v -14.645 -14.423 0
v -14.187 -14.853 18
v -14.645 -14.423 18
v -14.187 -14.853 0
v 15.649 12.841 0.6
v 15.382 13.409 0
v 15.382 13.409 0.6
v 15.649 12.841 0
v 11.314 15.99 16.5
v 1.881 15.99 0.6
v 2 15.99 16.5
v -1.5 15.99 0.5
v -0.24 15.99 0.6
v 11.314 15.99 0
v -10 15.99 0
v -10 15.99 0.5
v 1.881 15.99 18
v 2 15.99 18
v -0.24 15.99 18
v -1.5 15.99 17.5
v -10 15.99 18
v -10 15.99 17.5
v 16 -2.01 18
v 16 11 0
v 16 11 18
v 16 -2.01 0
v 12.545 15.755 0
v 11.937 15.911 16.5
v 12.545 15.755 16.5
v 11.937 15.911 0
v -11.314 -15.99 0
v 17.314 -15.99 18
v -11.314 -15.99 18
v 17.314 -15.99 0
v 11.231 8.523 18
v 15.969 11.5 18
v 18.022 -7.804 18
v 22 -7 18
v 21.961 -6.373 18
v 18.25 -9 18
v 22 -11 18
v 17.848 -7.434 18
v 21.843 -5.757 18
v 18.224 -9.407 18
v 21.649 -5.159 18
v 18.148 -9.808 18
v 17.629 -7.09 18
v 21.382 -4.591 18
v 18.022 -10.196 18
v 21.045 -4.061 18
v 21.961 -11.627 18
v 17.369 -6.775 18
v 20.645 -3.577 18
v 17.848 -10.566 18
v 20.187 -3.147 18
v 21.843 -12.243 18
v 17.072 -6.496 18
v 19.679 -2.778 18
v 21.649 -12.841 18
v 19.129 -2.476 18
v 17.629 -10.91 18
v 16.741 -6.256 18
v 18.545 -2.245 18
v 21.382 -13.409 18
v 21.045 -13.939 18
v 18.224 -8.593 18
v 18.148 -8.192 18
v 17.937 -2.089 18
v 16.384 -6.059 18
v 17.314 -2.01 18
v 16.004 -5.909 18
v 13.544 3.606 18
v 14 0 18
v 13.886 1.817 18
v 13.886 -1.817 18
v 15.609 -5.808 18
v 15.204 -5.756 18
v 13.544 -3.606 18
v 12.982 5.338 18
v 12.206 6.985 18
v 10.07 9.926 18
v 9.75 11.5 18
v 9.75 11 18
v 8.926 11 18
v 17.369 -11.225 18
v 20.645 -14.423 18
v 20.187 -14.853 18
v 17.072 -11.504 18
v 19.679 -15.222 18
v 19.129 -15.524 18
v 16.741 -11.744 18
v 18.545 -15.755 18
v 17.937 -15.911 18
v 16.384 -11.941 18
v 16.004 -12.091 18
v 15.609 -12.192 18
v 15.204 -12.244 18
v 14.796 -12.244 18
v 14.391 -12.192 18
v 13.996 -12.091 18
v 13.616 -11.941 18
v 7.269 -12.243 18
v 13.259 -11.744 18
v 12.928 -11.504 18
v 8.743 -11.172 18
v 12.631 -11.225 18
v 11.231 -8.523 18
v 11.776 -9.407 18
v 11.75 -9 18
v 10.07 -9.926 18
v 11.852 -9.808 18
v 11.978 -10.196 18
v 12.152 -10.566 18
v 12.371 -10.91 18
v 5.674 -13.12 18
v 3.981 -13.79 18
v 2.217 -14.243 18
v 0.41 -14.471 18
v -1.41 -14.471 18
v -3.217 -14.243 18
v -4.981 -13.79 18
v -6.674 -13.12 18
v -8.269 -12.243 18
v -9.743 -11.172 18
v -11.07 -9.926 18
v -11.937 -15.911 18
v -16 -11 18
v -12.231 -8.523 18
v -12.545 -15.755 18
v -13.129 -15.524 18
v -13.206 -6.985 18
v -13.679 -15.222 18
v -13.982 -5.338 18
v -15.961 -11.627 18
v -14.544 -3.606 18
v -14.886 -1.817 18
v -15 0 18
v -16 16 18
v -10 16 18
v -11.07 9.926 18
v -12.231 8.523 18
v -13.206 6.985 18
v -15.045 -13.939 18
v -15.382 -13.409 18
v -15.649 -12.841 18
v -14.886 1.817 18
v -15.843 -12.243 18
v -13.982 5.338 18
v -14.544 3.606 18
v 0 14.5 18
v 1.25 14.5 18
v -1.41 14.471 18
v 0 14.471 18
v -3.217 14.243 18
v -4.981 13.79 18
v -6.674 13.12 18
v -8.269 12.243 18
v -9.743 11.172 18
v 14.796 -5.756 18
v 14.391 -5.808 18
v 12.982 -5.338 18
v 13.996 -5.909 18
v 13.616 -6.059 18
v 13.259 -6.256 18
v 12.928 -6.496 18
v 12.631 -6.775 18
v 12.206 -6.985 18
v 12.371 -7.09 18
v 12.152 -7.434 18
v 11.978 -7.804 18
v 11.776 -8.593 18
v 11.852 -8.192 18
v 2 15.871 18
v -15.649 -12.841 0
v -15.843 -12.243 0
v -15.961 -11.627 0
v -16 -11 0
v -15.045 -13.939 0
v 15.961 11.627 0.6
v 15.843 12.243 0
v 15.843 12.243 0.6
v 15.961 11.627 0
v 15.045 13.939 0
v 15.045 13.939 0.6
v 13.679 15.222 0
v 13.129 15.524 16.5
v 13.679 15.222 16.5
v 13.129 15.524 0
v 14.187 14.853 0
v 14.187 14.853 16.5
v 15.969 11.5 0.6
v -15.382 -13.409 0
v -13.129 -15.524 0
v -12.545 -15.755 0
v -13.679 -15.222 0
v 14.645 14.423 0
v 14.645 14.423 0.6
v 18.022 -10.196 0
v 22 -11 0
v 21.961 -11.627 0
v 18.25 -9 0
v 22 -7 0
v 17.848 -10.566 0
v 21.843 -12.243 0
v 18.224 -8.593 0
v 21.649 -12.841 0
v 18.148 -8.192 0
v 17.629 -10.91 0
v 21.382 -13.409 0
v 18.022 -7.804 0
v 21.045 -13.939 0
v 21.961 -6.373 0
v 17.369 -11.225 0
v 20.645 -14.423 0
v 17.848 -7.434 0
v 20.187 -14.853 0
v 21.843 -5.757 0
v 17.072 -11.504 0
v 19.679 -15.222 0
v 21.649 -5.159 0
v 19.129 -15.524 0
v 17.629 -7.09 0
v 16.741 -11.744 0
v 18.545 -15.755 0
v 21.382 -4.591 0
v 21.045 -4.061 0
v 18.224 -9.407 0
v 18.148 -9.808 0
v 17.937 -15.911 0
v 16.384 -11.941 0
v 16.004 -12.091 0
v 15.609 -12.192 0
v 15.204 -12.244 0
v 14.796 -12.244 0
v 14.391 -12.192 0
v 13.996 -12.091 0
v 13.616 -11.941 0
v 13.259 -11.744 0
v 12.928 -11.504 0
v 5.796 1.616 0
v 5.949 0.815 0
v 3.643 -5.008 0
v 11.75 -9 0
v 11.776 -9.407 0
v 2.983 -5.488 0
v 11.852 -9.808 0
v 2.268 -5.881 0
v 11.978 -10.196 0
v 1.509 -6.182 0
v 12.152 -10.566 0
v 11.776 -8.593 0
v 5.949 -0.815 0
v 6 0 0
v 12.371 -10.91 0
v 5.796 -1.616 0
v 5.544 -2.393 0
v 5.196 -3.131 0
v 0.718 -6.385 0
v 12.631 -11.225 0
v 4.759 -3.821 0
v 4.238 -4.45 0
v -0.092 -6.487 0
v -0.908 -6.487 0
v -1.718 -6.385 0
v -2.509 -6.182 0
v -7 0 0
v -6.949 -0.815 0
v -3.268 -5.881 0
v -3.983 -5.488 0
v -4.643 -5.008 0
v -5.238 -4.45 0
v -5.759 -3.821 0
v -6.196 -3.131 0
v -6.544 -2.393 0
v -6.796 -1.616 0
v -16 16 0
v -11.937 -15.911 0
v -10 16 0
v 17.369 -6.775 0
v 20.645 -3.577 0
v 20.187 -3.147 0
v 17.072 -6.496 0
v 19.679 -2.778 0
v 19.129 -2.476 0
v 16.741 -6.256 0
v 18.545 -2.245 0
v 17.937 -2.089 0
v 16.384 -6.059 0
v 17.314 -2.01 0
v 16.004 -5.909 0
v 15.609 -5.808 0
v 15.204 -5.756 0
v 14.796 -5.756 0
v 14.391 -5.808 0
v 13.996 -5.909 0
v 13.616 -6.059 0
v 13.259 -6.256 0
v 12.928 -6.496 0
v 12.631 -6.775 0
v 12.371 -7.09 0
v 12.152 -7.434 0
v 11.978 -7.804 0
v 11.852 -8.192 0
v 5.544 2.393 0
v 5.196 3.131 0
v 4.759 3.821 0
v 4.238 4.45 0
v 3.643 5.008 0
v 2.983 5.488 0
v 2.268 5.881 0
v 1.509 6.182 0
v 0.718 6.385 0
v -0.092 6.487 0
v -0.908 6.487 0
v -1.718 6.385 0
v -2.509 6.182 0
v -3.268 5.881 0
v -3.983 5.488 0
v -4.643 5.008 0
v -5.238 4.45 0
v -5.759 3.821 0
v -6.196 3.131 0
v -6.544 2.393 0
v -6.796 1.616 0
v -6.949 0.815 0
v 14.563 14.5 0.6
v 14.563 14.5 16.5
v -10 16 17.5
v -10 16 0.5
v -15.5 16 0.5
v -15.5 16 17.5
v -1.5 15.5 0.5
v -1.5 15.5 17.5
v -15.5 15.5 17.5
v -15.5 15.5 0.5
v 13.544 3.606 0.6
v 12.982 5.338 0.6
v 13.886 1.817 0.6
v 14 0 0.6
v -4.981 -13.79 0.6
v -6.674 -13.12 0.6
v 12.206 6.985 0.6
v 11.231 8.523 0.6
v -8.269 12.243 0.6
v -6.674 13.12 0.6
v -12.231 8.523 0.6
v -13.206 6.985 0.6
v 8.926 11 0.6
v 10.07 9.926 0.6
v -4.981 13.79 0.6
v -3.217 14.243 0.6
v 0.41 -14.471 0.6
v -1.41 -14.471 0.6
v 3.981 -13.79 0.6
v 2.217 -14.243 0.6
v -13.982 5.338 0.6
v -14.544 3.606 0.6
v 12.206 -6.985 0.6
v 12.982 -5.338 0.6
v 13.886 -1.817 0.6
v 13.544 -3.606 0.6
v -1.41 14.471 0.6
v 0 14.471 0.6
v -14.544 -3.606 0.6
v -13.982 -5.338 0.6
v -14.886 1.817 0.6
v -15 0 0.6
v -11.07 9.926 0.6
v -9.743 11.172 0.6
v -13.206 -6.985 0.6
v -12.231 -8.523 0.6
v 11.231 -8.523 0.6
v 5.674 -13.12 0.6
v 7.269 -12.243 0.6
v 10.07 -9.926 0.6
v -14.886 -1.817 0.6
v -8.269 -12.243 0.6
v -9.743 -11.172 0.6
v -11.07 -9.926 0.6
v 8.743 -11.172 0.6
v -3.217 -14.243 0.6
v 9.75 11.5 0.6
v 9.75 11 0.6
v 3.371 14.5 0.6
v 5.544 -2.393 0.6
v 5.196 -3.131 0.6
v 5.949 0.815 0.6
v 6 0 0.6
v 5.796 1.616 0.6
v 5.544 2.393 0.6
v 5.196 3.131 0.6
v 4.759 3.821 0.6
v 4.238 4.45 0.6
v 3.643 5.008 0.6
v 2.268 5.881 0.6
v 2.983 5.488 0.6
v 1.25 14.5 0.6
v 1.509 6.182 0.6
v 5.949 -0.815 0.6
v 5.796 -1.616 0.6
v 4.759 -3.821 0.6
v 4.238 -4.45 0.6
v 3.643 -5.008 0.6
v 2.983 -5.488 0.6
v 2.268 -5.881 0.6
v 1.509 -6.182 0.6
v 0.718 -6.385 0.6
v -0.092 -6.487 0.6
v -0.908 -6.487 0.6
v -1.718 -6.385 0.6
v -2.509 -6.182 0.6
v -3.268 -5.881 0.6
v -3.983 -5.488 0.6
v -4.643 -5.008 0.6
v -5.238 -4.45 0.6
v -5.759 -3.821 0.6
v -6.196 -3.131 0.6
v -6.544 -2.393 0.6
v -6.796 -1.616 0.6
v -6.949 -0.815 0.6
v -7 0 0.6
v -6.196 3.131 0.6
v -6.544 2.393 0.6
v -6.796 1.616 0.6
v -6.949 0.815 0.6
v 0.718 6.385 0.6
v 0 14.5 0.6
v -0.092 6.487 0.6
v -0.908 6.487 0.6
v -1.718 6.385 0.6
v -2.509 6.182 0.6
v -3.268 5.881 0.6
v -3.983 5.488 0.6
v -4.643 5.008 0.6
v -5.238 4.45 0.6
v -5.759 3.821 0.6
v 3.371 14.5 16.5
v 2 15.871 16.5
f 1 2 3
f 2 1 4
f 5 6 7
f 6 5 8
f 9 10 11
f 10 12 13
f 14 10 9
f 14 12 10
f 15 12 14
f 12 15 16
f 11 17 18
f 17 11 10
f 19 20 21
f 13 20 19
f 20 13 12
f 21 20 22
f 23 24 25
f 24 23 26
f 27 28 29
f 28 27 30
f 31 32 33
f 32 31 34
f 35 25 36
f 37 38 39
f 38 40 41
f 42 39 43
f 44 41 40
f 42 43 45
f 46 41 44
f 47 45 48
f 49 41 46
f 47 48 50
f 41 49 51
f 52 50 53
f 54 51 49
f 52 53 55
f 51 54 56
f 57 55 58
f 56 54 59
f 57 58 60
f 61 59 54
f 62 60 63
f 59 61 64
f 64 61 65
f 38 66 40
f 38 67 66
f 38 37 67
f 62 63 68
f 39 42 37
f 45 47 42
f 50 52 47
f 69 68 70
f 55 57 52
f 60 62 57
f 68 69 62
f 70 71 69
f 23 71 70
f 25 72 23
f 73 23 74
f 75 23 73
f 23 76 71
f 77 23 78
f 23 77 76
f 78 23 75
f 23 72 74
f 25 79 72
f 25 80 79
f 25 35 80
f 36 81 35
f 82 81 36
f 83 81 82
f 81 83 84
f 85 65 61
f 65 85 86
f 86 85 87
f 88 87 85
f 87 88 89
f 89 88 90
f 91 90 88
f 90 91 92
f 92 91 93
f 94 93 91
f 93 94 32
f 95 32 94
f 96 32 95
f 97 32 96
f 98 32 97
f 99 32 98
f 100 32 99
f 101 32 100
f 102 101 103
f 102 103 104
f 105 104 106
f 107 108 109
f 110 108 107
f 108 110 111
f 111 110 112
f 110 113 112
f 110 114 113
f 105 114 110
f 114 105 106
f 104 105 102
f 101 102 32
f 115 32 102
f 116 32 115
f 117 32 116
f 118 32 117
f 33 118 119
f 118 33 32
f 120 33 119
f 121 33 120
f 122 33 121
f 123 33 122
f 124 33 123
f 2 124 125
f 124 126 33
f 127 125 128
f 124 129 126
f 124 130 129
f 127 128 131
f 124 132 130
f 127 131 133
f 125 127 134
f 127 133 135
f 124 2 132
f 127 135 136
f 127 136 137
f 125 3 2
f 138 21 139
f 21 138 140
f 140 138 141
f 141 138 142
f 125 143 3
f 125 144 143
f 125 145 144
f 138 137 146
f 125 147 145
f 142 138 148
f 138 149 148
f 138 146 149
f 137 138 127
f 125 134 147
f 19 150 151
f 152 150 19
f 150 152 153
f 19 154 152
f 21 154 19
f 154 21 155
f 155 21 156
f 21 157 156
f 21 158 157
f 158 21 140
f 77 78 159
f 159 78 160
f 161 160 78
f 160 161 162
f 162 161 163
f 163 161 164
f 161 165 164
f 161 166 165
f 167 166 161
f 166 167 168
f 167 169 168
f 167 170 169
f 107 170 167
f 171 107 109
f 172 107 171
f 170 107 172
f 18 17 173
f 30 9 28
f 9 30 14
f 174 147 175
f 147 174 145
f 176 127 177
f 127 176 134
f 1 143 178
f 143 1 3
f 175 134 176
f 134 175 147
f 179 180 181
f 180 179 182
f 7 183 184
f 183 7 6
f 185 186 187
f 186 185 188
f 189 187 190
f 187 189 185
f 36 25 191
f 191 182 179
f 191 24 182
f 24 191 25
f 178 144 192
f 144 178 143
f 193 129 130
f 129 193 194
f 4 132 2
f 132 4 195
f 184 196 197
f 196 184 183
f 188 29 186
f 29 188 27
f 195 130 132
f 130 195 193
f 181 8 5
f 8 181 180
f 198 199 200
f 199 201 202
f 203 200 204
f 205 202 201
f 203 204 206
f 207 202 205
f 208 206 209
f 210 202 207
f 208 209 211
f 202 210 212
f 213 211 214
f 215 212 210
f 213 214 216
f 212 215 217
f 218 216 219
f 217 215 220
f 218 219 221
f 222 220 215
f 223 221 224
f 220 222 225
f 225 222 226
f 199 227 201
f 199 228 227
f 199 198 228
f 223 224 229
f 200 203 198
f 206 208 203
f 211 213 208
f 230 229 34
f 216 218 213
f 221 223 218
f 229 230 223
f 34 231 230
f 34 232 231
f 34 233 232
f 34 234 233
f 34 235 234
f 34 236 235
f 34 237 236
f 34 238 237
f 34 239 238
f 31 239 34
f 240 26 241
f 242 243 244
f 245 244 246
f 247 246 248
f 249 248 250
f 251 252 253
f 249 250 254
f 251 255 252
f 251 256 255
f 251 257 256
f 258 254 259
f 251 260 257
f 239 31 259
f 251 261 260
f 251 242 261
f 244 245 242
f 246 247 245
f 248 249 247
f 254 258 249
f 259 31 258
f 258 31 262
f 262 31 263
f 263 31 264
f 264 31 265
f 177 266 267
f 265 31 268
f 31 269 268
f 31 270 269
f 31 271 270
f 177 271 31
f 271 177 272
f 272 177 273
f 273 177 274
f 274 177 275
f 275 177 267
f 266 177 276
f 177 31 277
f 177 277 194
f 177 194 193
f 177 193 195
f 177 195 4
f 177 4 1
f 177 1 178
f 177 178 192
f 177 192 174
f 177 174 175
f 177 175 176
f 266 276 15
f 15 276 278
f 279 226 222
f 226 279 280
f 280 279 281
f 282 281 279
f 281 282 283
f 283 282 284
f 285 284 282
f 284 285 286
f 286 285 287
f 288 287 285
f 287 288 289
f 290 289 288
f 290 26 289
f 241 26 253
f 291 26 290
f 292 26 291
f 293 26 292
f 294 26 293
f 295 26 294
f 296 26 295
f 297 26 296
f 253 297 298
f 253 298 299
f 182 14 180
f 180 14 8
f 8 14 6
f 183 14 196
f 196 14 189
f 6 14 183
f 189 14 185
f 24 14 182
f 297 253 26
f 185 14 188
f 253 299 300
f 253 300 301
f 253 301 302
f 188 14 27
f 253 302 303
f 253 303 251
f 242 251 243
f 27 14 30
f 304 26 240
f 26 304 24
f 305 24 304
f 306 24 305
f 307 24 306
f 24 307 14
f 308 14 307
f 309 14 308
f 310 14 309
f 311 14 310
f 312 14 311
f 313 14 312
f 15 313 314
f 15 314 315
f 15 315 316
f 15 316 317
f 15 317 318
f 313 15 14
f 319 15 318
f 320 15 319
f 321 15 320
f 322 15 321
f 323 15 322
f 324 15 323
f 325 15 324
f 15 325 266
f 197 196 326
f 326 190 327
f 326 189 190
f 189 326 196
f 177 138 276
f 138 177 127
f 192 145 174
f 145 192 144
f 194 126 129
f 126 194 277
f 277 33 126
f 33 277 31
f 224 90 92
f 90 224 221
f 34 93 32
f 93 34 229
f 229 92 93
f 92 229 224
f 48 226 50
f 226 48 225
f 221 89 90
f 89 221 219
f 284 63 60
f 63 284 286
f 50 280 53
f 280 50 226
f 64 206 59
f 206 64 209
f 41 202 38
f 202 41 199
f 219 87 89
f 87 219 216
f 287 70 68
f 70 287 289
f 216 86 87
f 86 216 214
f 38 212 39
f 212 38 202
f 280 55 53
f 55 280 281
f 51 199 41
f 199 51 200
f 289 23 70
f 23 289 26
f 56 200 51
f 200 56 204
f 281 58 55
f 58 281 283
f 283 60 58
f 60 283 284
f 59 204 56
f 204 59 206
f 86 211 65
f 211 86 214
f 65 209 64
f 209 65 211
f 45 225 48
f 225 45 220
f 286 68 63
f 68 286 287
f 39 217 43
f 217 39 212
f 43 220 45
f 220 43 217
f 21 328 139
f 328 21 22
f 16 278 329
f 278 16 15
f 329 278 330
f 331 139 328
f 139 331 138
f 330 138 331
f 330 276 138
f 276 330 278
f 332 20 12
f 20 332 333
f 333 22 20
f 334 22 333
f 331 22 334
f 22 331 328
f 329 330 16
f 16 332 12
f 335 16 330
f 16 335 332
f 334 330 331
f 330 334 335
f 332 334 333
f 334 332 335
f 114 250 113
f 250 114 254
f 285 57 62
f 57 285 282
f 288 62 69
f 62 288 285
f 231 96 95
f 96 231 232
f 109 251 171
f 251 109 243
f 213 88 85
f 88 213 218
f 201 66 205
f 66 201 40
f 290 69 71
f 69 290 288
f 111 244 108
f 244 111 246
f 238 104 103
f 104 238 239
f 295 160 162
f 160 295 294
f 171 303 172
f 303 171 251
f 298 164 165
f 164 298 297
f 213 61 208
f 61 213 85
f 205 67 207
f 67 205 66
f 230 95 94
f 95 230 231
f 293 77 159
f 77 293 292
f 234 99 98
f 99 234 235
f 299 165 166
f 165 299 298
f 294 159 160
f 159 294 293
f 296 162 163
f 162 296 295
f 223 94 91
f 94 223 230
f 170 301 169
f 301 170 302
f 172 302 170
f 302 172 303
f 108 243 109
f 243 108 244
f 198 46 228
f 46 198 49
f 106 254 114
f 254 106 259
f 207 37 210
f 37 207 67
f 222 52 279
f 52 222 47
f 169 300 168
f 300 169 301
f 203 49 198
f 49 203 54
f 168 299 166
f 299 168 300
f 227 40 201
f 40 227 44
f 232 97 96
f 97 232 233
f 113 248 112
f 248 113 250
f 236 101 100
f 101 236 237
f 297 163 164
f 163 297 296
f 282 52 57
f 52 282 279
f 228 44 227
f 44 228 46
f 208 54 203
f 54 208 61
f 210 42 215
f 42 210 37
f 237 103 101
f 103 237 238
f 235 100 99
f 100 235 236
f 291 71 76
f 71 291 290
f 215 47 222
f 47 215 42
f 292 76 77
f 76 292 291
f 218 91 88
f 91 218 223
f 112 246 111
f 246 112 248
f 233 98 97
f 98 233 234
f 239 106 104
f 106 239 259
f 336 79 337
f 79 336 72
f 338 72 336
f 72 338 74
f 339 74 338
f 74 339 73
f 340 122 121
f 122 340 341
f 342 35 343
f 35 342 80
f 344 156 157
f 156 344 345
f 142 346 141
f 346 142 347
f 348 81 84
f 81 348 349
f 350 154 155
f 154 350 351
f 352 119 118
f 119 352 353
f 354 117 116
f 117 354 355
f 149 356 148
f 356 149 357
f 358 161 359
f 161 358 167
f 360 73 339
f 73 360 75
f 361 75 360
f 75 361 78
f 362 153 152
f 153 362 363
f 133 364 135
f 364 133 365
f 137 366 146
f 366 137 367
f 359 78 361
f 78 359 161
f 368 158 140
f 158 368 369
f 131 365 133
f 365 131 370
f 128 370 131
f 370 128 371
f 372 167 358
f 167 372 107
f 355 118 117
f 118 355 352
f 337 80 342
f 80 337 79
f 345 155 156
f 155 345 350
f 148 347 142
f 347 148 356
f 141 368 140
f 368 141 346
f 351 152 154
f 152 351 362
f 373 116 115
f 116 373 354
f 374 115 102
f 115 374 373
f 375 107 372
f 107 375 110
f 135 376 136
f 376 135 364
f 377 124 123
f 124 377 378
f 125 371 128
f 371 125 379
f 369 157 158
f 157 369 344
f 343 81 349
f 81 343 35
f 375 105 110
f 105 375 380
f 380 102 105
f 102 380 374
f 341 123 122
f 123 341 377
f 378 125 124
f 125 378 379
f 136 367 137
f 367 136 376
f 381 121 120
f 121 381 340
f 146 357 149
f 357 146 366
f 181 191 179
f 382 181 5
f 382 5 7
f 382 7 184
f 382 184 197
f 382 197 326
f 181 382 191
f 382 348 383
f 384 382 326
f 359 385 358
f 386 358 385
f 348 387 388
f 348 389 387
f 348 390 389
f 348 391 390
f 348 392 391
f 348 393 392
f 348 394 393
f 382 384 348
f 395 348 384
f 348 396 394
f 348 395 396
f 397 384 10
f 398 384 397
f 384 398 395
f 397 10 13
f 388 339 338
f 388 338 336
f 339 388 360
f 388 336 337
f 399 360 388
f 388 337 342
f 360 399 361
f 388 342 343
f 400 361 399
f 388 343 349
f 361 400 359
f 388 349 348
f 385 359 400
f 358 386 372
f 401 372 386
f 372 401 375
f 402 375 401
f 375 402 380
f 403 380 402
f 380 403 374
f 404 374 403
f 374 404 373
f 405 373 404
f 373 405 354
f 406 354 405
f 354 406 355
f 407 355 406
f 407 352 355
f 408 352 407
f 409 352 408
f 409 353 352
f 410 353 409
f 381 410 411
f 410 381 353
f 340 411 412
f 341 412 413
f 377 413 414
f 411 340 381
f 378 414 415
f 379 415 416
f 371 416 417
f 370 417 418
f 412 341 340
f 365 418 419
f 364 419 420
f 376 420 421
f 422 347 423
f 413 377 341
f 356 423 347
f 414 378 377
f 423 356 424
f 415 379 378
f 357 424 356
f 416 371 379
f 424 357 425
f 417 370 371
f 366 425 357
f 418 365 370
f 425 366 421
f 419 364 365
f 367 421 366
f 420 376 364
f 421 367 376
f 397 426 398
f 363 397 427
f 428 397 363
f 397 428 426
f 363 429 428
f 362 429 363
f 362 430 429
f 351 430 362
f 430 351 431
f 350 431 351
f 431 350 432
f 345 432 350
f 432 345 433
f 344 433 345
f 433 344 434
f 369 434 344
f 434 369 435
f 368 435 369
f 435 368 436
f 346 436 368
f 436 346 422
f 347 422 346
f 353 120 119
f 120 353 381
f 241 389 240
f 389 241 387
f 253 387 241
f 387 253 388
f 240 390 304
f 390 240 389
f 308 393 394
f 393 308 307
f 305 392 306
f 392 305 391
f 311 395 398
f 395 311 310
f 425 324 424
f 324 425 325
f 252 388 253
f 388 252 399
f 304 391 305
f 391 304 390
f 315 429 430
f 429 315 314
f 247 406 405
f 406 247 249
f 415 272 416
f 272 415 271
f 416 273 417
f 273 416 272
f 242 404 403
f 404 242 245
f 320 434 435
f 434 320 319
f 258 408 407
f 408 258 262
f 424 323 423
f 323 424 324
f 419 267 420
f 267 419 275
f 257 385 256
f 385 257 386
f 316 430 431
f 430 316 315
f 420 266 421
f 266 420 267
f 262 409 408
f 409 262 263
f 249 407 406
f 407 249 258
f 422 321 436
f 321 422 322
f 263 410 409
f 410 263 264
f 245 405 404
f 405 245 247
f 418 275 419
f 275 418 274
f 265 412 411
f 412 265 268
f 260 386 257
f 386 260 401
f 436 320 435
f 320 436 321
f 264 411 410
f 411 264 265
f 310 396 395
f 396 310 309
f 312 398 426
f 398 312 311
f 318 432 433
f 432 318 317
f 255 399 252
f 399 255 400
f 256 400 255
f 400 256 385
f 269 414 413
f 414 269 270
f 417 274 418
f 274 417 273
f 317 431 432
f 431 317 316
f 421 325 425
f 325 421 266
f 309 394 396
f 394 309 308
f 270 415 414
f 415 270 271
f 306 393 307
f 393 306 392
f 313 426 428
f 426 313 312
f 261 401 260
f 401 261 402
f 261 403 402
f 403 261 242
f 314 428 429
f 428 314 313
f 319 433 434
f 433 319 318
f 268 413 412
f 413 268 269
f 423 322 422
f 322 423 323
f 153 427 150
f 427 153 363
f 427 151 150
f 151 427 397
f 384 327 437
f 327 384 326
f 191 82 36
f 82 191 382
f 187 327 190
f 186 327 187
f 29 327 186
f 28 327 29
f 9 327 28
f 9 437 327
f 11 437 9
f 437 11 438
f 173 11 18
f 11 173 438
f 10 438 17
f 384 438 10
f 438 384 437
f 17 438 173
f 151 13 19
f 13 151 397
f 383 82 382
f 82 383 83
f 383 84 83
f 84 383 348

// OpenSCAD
$fn = 50;


difference() {
	union() {
		hull() {
			translate(v = [-11.0000000000, 11.0000000000, 0]) {
				cylinder(h = 18, r = 5);
			}
			translate(v = [11.0000000000, 11.0000000000, 0]) {
				cylinder(h = 18, r = 5);
			}
			translate(v = [-11.0000000000, -11.0000000000, 0]) {
				cylinder(h = 18, r = 5);
			}
			translate(v = [11.0000000000, -11.0000000000, 0]) {
				cylinder(h = 18, r = 5);
			}
		}
		translate(v = [7.5000000000, -9.0000000000, 0]) {
			hull() {
				translate(v = [-9.5000000000, 2.0000000000, 0]) {
					cylinder(h = 18, r = 5);
				}
				translate(v = [9.5000000000, 2.0000000000, 0]) {
					cylinder(h = 18, r = 5);
				}
				translate(v = [-9.5000000000, -2.0000000000, 0]) {
					cylinder(h = 18, r = 5);
				}
				translate(v = [9.5000000000, -2.0000000000, 0]) {
					cylinder(h = 18, r = 5);
				}
			}
		}
		translate(v = [-16.0000000000, 10.0000000000, 0]) {
			cube(size = [6, 6, 18]);
		}
	}
	union() {
		translate(v = [-15.5000000000, 15.5000000000, 0.5000000000]) {
			cube(size = [14, 0.5000000000, 17.0000000000]);
		}
		translate(v = [15.0000000000, -9.0000000000, -50.0000000000]) {
			cylinder(h = 100, r = 3.2500000000);
		}
		translate(v = [-0.5000000000, 0.0000000000, 0.6000000000]) {
			cylinder(h = 20.4000000000, r = 14.5000000000);
		}
		translate(v = [-0.5000000000, 0.0000000000, -9.0000000000]) {
			cylinder(h = 18, r = 6.5000000000);
		}
		translate(v = [0.0000000000, 11.5000000000, 0.6000000000]) {
			cube(size = [16.0000000000, 3, 20.4000000000]);
		}
		translate(v = [2.0000000000, 11.5000000000, 16.5000000000]) {
			cube(size = [14.0000000000, 6, 1.5000000000]);
		}
		translate(v = [-3.0000000000, 18.7500000000, 0.6000000000]) {
			rotate(a = [0, 0, -45]) {
				cube(size = [10, 1.5000000000, 20.4000000000]);
			}
		}
		translate(v = [2.2500000000, 11.0000000000, 0.6000000000]) {
			cube(size = [7.5000000000, 2, 17.4000000000]);
		}
	}
}
